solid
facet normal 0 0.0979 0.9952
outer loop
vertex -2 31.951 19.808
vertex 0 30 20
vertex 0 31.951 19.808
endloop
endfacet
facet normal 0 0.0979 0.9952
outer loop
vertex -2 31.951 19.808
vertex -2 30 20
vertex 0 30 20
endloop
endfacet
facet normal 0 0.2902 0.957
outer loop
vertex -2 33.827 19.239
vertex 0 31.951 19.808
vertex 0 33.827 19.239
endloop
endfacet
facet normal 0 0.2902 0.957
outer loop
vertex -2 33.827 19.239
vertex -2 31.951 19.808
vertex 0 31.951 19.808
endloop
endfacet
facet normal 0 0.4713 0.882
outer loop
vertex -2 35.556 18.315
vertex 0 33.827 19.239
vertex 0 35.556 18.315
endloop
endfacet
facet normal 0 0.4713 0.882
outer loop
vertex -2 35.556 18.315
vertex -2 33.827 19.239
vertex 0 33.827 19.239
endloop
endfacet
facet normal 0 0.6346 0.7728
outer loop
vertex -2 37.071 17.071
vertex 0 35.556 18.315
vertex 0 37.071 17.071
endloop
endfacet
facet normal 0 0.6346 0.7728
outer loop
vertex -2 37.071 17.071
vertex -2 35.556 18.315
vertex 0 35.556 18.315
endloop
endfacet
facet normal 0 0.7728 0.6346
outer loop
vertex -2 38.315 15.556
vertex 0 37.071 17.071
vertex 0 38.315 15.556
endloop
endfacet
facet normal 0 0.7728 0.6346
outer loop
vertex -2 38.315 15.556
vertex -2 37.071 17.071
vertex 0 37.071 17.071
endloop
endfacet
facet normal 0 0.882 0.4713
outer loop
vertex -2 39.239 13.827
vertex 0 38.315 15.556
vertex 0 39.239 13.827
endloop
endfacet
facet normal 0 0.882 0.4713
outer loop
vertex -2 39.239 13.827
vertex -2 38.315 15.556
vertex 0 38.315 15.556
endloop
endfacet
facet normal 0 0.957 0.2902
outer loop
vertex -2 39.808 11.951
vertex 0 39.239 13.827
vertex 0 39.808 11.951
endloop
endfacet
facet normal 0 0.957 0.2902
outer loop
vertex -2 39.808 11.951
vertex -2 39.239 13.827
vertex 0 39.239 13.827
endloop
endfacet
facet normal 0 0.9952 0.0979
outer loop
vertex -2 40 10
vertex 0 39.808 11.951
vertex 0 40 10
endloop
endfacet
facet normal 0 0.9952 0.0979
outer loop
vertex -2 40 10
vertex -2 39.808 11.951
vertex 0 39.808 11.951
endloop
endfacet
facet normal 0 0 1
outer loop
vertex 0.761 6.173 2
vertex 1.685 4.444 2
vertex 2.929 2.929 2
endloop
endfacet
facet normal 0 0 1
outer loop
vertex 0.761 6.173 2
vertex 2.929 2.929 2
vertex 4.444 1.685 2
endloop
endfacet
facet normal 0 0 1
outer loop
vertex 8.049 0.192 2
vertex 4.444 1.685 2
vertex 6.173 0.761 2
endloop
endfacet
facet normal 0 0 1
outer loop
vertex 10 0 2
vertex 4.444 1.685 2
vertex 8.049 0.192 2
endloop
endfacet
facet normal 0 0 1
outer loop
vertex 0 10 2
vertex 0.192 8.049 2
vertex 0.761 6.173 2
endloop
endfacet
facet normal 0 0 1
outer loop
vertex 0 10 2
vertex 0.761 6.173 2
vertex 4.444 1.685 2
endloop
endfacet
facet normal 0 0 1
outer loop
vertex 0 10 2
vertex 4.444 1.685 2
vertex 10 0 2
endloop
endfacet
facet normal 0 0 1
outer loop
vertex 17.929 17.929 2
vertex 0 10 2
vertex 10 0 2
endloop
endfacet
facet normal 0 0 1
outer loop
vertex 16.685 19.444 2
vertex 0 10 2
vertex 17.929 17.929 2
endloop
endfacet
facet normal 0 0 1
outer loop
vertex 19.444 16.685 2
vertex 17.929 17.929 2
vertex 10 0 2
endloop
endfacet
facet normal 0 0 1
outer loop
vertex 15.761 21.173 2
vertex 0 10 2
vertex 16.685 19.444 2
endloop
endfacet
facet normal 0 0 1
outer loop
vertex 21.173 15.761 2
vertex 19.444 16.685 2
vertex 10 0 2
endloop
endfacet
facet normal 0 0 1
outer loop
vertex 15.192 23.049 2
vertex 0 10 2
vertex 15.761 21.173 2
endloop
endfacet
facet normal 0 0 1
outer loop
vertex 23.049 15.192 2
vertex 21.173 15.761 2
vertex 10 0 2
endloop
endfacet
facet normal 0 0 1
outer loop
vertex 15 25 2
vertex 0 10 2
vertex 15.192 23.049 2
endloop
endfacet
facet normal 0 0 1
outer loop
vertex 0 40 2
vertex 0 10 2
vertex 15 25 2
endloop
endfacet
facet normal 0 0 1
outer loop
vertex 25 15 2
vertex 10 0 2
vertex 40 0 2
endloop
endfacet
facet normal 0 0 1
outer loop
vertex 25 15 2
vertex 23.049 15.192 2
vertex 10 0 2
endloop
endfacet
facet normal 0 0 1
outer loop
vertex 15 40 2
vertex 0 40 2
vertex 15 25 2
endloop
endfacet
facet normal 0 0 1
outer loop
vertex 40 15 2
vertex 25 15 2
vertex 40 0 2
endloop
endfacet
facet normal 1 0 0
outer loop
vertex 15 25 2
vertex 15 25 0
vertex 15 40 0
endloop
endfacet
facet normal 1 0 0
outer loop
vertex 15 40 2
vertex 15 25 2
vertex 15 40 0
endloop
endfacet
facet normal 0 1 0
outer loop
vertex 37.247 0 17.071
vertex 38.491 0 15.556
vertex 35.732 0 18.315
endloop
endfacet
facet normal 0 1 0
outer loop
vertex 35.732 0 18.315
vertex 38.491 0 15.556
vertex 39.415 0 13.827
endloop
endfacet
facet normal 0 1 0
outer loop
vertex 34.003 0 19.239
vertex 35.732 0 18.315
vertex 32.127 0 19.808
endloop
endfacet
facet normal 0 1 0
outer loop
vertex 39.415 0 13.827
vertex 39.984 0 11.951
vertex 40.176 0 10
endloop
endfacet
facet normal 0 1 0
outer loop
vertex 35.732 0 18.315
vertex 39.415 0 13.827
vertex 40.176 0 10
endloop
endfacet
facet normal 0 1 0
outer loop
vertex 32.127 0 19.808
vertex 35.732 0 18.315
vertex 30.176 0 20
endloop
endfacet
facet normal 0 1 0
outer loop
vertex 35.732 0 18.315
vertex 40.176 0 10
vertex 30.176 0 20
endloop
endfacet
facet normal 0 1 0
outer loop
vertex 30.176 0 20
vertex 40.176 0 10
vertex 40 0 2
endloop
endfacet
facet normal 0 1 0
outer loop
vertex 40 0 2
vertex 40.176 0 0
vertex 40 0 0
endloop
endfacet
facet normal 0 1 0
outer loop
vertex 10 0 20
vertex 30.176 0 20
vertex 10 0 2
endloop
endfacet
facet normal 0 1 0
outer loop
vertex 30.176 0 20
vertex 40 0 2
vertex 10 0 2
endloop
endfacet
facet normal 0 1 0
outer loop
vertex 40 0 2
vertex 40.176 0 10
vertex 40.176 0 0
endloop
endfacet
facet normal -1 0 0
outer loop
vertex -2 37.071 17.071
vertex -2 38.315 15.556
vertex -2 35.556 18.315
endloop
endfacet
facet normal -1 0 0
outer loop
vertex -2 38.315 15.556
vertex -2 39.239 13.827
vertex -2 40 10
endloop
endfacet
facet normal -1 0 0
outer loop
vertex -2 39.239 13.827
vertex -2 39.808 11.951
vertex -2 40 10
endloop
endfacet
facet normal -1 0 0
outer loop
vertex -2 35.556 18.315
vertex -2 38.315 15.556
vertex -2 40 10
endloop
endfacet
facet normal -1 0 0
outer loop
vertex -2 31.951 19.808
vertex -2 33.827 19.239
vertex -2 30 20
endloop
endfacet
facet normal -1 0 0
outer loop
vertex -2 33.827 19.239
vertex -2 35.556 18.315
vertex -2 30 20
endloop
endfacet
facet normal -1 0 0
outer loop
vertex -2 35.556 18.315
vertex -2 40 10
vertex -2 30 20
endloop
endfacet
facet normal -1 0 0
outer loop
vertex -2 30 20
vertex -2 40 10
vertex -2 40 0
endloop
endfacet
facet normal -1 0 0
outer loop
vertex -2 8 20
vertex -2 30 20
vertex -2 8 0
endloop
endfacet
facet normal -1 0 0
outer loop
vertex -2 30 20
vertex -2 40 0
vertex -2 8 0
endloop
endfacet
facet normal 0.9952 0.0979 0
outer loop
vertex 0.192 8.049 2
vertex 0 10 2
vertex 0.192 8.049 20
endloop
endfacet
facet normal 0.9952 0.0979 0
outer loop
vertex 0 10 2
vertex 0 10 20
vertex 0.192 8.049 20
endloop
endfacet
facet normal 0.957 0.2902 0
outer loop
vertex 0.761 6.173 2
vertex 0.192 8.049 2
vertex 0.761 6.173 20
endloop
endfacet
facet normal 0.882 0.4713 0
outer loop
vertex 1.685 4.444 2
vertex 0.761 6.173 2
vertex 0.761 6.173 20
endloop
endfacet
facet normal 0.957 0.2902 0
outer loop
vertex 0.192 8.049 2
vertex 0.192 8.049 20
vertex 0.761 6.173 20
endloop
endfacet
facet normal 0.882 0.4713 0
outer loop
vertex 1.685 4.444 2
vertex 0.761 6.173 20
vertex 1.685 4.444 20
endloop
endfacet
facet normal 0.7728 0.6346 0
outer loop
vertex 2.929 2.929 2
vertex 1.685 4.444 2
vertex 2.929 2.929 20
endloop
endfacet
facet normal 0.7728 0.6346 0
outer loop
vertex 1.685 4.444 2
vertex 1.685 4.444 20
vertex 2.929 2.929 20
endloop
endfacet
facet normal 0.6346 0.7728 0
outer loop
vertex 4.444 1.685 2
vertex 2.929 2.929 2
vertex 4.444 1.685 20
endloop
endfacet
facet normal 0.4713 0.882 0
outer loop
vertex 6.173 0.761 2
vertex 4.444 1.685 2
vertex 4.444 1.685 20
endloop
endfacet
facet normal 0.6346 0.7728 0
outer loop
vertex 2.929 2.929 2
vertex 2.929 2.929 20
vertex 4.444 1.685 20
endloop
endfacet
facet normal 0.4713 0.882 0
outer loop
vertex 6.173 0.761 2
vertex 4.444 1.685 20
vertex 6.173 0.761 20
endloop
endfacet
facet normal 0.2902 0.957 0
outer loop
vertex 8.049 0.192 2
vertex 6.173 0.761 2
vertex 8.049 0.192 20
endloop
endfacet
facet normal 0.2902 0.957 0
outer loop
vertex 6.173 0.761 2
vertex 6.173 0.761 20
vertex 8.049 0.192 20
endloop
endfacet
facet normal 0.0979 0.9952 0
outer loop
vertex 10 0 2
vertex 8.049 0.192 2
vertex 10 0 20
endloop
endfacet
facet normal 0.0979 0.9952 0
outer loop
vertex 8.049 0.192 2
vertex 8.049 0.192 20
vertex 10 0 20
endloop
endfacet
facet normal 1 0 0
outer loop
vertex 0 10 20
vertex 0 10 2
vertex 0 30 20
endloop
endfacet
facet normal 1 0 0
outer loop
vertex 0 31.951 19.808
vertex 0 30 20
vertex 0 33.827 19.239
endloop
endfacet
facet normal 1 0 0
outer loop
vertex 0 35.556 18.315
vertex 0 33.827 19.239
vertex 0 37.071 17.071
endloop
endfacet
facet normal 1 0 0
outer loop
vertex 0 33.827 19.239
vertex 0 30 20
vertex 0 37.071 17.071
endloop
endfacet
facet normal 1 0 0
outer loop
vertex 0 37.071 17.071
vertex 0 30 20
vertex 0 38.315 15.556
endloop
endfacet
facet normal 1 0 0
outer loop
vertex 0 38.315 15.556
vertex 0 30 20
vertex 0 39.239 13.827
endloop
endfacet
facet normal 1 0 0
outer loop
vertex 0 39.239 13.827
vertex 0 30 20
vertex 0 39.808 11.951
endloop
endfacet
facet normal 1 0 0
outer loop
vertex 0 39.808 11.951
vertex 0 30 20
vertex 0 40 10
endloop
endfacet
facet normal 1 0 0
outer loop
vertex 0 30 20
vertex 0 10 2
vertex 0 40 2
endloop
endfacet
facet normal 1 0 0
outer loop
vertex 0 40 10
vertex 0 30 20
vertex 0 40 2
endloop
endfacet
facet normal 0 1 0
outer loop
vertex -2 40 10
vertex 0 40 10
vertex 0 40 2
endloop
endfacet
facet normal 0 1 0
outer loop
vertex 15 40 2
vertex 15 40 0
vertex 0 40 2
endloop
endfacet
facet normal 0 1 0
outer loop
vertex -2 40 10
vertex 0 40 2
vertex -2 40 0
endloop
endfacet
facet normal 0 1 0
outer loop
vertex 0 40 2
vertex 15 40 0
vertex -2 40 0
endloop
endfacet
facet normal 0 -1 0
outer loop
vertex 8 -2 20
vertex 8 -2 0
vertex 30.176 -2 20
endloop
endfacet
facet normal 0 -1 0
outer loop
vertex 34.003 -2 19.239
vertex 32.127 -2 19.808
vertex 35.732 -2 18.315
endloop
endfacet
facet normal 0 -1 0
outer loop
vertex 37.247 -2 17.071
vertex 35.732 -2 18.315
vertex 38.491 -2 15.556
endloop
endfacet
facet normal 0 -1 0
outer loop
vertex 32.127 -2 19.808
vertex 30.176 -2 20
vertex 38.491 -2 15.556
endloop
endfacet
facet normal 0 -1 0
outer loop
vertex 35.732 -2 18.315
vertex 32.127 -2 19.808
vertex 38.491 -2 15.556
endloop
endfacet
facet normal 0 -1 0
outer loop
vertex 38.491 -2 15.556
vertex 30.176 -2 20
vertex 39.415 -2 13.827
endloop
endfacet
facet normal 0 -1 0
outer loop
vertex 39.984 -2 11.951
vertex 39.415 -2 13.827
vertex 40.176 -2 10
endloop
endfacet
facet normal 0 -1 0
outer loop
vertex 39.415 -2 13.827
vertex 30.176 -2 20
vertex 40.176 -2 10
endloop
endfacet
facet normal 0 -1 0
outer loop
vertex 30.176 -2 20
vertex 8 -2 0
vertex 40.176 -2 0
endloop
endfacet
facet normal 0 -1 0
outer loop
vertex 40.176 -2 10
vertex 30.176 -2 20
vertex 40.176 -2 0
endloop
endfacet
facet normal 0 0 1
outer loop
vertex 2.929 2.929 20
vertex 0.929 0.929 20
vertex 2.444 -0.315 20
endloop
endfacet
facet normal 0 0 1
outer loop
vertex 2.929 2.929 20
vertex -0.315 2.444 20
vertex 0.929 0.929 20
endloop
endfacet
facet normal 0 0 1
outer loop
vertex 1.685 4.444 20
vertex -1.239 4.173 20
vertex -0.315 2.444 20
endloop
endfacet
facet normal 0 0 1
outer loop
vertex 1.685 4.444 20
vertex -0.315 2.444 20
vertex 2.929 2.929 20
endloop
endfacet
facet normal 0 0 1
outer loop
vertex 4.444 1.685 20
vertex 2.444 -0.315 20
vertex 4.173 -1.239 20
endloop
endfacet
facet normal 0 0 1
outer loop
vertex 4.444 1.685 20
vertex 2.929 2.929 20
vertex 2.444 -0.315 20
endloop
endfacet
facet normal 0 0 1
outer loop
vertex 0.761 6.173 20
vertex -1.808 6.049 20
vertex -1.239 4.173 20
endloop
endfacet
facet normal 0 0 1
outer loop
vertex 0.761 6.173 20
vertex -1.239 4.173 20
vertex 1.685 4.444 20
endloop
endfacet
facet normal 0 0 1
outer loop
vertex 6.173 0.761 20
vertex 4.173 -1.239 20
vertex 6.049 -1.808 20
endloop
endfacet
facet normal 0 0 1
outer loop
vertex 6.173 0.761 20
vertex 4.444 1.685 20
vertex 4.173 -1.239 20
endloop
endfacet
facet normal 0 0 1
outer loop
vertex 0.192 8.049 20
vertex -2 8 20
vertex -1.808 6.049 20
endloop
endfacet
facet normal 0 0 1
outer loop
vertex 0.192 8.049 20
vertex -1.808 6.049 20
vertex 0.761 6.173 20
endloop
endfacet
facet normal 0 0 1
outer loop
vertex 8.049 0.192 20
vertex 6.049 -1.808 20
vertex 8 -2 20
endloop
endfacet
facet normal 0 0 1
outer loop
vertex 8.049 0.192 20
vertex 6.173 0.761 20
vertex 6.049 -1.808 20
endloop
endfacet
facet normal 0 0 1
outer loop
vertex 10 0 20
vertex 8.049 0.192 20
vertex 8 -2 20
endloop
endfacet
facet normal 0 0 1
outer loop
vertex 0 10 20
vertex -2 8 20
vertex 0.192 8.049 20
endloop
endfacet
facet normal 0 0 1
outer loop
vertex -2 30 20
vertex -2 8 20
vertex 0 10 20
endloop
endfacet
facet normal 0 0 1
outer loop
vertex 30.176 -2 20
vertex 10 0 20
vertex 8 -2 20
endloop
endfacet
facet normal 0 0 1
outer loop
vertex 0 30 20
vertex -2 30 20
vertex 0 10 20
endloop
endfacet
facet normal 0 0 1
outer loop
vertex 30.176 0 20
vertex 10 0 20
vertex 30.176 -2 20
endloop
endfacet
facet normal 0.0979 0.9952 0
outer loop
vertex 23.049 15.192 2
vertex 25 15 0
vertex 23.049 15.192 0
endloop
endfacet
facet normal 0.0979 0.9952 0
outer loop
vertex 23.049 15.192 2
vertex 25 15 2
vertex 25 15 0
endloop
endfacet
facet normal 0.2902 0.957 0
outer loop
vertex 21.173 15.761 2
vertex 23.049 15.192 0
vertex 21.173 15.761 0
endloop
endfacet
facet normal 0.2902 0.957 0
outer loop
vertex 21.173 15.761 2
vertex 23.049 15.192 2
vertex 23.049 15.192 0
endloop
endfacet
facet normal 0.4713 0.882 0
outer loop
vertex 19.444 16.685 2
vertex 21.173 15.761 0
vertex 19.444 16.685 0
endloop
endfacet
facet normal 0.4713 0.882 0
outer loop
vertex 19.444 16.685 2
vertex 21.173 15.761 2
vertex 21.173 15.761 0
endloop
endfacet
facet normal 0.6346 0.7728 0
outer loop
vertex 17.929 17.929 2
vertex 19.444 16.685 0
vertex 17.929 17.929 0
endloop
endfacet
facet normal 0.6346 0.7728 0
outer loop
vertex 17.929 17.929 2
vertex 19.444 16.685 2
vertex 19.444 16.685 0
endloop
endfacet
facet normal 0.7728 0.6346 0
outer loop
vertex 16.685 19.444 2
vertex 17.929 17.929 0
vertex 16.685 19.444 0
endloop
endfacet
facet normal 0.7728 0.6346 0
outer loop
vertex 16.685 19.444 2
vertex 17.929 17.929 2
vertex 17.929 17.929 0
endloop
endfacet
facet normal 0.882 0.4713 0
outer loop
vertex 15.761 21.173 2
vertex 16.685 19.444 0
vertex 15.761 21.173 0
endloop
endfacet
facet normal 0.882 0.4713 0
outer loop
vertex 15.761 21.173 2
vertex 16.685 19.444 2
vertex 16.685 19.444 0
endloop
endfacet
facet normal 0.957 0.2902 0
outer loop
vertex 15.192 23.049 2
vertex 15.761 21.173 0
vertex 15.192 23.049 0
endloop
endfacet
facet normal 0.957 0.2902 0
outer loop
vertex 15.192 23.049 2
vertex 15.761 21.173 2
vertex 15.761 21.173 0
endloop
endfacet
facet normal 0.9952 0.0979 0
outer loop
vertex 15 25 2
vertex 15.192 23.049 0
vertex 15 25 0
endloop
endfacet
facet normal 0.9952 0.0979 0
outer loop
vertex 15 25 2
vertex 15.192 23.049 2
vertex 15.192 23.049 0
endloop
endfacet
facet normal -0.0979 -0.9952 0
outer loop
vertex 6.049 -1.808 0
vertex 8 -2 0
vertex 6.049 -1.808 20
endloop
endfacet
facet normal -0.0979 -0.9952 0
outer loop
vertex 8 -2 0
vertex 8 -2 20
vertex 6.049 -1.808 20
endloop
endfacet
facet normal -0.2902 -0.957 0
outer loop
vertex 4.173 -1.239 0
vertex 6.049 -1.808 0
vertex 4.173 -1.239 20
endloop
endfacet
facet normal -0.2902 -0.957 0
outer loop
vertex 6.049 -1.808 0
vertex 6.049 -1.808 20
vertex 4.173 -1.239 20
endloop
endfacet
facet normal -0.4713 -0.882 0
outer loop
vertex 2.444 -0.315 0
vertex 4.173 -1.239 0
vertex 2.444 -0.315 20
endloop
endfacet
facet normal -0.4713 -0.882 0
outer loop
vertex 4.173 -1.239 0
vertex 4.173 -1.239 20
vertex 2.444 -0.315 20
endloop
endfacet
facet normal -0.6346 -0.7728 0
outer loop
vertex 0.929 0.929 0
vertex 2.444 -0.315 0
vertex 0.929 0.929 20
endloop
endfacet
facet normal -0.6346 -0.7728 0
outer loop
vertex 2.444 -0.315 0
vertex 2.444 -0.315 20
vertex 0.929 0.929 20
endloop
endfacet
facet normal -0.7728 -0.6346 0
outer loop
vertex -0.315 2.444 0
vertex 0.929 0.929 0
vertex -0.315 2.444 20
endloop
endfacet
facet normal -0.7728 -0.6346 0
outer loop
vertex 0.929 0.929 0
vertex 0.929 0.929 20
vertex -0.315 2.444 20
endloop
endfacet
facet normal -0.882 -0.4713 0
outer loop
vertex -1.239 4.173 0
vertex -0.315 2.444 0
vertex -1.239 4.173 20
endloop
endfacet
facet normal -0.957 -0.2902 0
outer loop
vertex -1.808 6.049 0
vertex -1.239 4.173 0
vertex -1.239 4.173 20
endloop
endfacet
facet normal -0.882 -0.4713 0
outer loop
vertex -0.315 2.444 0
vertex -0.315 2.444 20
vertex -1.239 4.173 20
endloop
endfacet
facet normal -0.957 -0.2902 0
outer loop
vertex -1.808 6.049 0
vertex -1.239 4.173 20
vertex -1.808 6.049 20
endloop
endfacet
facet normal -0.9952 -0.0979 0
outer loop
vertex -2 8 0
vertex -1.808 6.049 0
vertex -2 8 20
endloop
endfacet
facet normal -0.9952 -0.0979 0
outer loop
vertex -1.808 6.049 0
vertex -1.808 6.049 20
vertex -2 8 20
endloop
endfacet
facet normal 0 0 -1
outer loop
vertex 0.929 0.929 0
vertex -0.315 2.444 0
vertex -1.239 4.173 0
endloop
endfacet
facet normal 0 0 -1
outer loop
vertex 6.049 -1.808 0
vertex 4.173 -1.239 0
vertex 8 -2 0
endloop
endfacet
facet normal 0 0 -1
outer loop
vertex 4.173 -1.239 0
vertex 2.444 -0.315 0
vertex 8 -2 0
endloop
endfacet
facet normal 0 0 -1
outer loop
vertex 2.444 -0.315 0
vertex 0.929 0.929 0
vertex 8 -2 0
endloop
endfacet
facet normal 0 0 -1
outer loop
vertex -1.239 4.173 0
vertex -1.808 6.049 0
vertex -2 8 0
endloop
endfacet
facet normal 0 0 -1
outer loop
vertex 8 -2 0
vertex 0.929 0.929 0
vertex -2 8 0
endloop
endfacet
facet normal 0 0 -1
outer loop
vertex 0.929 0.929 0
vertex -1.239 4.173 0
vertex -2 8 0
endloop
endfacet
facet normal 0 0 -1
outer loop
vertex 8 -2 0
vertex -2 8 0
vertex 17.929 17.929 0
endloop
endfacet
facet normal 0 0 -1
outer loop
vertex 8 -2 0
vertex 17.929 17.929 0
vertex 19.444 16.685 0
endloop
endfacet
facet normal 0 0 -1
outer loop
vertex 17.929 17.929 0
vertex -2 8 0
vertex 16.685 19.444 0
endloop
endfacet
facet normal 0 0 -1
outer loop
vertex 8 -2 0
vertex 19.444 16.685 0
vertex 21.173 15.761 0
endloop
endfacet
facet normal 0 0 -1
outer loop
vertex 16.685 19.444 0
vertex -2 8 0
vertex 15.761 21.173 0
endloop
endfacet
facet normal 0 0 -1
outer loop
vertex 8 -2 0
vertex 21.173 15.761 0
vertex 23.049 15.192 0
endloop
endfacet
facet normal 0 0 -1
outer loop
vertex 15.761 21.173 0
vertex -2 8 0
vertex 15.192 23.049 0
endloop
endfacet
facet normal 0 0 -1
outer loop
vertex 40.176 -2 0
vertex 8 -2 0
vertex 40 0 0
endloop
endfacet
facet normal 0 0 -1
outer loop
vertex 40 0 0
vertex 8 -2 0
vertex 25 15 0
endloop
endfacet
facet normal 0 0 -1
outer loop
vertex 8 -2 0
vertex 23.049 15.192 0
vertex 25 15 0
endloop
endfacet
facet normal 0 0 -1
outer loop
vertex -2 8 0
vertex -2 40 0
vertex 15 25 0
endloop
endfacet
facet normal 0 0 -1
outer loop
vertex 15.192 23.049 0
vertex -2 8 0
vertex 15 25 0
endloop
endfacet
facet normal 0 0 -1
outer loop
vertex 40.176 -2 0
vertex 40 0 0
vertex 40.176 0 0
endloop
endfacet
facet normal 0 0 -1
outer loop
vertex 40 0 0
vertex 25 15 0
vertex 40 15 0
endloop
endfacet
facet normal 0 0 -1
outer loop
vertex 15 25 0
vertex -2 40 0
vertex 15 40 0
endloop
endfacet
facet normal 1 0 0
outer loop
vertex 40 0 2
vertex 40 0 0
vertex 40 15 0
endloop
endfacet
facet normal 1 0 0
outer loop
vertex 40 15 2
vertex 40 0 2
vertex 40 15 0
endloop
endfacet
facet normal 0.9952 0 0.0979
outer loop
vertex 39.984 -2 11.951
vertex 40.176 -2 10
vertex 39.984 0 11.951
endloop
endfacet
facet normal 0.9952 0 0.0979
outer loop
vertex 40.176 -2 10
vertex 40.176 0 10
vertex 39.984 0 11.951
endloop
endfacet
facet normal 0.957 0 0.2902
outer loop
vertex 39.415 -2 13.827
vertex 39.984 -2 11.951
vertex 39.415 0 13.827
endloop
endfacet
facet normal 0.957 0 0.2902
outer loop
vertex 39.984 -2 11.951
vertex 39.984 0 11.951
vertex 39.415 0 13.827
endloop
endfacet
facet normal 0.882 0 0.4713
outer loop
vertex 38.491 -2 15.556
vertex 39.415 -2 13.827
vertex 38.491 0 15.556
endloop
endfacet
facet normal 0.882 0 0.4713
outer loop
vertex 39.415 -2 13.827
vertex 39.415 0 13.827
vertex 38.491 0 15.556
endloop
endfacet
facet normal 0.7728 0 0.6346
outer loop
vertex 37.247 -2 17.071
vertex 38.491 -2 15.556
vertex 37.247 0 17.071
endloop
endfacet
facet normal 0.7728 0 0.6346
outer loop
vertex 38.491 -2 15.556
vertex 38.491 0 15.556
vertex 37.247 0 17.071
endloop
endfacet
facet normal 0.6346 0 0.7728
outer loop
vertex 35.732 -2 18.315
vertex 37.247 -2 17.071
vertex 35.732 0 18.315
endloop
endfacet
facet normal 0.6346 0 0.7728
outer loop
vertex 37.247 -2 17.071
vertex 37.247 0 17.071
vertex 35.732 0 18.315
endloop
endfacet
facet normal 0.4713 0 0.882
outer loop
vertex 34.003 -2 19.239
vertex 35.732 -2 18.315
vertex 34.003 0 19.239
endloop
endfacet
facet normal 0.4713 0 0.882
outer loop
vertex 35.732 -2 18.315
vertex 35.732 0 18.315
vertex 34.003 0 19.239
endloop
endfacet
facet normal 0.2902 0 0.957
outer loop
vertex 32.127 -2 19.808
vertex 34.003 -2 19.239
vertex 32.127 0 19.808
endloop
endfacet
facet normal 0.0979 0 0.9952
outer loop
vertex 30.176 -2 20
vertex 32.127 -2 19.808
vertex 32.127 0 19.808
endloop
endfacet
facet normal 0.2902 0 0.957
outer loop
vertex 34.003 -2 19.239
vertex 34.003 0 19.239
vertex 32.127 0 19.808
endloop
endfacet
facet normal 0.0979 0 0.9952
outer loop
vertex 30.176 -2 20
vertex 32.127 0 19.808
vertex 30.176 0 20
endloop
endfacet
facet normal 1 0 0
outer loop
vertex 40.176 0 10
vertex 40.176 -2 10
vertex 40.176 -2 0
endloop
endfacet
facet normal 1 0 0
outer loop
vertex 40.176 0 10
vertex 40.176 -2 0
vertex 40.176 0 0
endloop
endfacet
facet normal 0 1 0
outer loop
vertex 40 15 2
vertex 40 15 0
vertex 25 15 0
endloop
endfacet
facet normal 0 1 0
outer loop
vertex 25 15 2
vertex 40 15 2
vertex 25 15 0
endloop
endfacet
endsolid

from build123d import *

# Parameters (mm, degrees)
F1_DEPTH = 2
F3_DEPTH = 20
F4_R     = 10


with BuildPart() as f1:
    # F0 (on Top) → F1 (new body)
    with BuildSketch(Plane.XY):
        Polygon((15, 40), (0, 40), (0, 0), (40, 0), (40, 15), (15, 15), align=None)
    extrude(amount=F1_DEPTH)

    # F2 (on Top) → F3 (join)
    with BuildSketch(Plane.XY):
        Polygon((0, 0), (0, 40), (-2, 40), (-2, -2), (40.175851, -2), (40.175851, 0), align=None)
    extrude(amount=F3_DEPTH)

    # F4
    f4_edges = [f1.edges().sort_by_distance(p)[0] for p in [
        (0, 0, 11),
        (15, 15, 1),
        (-2, -2, 10),
        (-1, 40, 20),
        (40.175851, -1, 20),
    ]]
    fillet(f4_edges, radius=F4_R)


solid = f1.part
